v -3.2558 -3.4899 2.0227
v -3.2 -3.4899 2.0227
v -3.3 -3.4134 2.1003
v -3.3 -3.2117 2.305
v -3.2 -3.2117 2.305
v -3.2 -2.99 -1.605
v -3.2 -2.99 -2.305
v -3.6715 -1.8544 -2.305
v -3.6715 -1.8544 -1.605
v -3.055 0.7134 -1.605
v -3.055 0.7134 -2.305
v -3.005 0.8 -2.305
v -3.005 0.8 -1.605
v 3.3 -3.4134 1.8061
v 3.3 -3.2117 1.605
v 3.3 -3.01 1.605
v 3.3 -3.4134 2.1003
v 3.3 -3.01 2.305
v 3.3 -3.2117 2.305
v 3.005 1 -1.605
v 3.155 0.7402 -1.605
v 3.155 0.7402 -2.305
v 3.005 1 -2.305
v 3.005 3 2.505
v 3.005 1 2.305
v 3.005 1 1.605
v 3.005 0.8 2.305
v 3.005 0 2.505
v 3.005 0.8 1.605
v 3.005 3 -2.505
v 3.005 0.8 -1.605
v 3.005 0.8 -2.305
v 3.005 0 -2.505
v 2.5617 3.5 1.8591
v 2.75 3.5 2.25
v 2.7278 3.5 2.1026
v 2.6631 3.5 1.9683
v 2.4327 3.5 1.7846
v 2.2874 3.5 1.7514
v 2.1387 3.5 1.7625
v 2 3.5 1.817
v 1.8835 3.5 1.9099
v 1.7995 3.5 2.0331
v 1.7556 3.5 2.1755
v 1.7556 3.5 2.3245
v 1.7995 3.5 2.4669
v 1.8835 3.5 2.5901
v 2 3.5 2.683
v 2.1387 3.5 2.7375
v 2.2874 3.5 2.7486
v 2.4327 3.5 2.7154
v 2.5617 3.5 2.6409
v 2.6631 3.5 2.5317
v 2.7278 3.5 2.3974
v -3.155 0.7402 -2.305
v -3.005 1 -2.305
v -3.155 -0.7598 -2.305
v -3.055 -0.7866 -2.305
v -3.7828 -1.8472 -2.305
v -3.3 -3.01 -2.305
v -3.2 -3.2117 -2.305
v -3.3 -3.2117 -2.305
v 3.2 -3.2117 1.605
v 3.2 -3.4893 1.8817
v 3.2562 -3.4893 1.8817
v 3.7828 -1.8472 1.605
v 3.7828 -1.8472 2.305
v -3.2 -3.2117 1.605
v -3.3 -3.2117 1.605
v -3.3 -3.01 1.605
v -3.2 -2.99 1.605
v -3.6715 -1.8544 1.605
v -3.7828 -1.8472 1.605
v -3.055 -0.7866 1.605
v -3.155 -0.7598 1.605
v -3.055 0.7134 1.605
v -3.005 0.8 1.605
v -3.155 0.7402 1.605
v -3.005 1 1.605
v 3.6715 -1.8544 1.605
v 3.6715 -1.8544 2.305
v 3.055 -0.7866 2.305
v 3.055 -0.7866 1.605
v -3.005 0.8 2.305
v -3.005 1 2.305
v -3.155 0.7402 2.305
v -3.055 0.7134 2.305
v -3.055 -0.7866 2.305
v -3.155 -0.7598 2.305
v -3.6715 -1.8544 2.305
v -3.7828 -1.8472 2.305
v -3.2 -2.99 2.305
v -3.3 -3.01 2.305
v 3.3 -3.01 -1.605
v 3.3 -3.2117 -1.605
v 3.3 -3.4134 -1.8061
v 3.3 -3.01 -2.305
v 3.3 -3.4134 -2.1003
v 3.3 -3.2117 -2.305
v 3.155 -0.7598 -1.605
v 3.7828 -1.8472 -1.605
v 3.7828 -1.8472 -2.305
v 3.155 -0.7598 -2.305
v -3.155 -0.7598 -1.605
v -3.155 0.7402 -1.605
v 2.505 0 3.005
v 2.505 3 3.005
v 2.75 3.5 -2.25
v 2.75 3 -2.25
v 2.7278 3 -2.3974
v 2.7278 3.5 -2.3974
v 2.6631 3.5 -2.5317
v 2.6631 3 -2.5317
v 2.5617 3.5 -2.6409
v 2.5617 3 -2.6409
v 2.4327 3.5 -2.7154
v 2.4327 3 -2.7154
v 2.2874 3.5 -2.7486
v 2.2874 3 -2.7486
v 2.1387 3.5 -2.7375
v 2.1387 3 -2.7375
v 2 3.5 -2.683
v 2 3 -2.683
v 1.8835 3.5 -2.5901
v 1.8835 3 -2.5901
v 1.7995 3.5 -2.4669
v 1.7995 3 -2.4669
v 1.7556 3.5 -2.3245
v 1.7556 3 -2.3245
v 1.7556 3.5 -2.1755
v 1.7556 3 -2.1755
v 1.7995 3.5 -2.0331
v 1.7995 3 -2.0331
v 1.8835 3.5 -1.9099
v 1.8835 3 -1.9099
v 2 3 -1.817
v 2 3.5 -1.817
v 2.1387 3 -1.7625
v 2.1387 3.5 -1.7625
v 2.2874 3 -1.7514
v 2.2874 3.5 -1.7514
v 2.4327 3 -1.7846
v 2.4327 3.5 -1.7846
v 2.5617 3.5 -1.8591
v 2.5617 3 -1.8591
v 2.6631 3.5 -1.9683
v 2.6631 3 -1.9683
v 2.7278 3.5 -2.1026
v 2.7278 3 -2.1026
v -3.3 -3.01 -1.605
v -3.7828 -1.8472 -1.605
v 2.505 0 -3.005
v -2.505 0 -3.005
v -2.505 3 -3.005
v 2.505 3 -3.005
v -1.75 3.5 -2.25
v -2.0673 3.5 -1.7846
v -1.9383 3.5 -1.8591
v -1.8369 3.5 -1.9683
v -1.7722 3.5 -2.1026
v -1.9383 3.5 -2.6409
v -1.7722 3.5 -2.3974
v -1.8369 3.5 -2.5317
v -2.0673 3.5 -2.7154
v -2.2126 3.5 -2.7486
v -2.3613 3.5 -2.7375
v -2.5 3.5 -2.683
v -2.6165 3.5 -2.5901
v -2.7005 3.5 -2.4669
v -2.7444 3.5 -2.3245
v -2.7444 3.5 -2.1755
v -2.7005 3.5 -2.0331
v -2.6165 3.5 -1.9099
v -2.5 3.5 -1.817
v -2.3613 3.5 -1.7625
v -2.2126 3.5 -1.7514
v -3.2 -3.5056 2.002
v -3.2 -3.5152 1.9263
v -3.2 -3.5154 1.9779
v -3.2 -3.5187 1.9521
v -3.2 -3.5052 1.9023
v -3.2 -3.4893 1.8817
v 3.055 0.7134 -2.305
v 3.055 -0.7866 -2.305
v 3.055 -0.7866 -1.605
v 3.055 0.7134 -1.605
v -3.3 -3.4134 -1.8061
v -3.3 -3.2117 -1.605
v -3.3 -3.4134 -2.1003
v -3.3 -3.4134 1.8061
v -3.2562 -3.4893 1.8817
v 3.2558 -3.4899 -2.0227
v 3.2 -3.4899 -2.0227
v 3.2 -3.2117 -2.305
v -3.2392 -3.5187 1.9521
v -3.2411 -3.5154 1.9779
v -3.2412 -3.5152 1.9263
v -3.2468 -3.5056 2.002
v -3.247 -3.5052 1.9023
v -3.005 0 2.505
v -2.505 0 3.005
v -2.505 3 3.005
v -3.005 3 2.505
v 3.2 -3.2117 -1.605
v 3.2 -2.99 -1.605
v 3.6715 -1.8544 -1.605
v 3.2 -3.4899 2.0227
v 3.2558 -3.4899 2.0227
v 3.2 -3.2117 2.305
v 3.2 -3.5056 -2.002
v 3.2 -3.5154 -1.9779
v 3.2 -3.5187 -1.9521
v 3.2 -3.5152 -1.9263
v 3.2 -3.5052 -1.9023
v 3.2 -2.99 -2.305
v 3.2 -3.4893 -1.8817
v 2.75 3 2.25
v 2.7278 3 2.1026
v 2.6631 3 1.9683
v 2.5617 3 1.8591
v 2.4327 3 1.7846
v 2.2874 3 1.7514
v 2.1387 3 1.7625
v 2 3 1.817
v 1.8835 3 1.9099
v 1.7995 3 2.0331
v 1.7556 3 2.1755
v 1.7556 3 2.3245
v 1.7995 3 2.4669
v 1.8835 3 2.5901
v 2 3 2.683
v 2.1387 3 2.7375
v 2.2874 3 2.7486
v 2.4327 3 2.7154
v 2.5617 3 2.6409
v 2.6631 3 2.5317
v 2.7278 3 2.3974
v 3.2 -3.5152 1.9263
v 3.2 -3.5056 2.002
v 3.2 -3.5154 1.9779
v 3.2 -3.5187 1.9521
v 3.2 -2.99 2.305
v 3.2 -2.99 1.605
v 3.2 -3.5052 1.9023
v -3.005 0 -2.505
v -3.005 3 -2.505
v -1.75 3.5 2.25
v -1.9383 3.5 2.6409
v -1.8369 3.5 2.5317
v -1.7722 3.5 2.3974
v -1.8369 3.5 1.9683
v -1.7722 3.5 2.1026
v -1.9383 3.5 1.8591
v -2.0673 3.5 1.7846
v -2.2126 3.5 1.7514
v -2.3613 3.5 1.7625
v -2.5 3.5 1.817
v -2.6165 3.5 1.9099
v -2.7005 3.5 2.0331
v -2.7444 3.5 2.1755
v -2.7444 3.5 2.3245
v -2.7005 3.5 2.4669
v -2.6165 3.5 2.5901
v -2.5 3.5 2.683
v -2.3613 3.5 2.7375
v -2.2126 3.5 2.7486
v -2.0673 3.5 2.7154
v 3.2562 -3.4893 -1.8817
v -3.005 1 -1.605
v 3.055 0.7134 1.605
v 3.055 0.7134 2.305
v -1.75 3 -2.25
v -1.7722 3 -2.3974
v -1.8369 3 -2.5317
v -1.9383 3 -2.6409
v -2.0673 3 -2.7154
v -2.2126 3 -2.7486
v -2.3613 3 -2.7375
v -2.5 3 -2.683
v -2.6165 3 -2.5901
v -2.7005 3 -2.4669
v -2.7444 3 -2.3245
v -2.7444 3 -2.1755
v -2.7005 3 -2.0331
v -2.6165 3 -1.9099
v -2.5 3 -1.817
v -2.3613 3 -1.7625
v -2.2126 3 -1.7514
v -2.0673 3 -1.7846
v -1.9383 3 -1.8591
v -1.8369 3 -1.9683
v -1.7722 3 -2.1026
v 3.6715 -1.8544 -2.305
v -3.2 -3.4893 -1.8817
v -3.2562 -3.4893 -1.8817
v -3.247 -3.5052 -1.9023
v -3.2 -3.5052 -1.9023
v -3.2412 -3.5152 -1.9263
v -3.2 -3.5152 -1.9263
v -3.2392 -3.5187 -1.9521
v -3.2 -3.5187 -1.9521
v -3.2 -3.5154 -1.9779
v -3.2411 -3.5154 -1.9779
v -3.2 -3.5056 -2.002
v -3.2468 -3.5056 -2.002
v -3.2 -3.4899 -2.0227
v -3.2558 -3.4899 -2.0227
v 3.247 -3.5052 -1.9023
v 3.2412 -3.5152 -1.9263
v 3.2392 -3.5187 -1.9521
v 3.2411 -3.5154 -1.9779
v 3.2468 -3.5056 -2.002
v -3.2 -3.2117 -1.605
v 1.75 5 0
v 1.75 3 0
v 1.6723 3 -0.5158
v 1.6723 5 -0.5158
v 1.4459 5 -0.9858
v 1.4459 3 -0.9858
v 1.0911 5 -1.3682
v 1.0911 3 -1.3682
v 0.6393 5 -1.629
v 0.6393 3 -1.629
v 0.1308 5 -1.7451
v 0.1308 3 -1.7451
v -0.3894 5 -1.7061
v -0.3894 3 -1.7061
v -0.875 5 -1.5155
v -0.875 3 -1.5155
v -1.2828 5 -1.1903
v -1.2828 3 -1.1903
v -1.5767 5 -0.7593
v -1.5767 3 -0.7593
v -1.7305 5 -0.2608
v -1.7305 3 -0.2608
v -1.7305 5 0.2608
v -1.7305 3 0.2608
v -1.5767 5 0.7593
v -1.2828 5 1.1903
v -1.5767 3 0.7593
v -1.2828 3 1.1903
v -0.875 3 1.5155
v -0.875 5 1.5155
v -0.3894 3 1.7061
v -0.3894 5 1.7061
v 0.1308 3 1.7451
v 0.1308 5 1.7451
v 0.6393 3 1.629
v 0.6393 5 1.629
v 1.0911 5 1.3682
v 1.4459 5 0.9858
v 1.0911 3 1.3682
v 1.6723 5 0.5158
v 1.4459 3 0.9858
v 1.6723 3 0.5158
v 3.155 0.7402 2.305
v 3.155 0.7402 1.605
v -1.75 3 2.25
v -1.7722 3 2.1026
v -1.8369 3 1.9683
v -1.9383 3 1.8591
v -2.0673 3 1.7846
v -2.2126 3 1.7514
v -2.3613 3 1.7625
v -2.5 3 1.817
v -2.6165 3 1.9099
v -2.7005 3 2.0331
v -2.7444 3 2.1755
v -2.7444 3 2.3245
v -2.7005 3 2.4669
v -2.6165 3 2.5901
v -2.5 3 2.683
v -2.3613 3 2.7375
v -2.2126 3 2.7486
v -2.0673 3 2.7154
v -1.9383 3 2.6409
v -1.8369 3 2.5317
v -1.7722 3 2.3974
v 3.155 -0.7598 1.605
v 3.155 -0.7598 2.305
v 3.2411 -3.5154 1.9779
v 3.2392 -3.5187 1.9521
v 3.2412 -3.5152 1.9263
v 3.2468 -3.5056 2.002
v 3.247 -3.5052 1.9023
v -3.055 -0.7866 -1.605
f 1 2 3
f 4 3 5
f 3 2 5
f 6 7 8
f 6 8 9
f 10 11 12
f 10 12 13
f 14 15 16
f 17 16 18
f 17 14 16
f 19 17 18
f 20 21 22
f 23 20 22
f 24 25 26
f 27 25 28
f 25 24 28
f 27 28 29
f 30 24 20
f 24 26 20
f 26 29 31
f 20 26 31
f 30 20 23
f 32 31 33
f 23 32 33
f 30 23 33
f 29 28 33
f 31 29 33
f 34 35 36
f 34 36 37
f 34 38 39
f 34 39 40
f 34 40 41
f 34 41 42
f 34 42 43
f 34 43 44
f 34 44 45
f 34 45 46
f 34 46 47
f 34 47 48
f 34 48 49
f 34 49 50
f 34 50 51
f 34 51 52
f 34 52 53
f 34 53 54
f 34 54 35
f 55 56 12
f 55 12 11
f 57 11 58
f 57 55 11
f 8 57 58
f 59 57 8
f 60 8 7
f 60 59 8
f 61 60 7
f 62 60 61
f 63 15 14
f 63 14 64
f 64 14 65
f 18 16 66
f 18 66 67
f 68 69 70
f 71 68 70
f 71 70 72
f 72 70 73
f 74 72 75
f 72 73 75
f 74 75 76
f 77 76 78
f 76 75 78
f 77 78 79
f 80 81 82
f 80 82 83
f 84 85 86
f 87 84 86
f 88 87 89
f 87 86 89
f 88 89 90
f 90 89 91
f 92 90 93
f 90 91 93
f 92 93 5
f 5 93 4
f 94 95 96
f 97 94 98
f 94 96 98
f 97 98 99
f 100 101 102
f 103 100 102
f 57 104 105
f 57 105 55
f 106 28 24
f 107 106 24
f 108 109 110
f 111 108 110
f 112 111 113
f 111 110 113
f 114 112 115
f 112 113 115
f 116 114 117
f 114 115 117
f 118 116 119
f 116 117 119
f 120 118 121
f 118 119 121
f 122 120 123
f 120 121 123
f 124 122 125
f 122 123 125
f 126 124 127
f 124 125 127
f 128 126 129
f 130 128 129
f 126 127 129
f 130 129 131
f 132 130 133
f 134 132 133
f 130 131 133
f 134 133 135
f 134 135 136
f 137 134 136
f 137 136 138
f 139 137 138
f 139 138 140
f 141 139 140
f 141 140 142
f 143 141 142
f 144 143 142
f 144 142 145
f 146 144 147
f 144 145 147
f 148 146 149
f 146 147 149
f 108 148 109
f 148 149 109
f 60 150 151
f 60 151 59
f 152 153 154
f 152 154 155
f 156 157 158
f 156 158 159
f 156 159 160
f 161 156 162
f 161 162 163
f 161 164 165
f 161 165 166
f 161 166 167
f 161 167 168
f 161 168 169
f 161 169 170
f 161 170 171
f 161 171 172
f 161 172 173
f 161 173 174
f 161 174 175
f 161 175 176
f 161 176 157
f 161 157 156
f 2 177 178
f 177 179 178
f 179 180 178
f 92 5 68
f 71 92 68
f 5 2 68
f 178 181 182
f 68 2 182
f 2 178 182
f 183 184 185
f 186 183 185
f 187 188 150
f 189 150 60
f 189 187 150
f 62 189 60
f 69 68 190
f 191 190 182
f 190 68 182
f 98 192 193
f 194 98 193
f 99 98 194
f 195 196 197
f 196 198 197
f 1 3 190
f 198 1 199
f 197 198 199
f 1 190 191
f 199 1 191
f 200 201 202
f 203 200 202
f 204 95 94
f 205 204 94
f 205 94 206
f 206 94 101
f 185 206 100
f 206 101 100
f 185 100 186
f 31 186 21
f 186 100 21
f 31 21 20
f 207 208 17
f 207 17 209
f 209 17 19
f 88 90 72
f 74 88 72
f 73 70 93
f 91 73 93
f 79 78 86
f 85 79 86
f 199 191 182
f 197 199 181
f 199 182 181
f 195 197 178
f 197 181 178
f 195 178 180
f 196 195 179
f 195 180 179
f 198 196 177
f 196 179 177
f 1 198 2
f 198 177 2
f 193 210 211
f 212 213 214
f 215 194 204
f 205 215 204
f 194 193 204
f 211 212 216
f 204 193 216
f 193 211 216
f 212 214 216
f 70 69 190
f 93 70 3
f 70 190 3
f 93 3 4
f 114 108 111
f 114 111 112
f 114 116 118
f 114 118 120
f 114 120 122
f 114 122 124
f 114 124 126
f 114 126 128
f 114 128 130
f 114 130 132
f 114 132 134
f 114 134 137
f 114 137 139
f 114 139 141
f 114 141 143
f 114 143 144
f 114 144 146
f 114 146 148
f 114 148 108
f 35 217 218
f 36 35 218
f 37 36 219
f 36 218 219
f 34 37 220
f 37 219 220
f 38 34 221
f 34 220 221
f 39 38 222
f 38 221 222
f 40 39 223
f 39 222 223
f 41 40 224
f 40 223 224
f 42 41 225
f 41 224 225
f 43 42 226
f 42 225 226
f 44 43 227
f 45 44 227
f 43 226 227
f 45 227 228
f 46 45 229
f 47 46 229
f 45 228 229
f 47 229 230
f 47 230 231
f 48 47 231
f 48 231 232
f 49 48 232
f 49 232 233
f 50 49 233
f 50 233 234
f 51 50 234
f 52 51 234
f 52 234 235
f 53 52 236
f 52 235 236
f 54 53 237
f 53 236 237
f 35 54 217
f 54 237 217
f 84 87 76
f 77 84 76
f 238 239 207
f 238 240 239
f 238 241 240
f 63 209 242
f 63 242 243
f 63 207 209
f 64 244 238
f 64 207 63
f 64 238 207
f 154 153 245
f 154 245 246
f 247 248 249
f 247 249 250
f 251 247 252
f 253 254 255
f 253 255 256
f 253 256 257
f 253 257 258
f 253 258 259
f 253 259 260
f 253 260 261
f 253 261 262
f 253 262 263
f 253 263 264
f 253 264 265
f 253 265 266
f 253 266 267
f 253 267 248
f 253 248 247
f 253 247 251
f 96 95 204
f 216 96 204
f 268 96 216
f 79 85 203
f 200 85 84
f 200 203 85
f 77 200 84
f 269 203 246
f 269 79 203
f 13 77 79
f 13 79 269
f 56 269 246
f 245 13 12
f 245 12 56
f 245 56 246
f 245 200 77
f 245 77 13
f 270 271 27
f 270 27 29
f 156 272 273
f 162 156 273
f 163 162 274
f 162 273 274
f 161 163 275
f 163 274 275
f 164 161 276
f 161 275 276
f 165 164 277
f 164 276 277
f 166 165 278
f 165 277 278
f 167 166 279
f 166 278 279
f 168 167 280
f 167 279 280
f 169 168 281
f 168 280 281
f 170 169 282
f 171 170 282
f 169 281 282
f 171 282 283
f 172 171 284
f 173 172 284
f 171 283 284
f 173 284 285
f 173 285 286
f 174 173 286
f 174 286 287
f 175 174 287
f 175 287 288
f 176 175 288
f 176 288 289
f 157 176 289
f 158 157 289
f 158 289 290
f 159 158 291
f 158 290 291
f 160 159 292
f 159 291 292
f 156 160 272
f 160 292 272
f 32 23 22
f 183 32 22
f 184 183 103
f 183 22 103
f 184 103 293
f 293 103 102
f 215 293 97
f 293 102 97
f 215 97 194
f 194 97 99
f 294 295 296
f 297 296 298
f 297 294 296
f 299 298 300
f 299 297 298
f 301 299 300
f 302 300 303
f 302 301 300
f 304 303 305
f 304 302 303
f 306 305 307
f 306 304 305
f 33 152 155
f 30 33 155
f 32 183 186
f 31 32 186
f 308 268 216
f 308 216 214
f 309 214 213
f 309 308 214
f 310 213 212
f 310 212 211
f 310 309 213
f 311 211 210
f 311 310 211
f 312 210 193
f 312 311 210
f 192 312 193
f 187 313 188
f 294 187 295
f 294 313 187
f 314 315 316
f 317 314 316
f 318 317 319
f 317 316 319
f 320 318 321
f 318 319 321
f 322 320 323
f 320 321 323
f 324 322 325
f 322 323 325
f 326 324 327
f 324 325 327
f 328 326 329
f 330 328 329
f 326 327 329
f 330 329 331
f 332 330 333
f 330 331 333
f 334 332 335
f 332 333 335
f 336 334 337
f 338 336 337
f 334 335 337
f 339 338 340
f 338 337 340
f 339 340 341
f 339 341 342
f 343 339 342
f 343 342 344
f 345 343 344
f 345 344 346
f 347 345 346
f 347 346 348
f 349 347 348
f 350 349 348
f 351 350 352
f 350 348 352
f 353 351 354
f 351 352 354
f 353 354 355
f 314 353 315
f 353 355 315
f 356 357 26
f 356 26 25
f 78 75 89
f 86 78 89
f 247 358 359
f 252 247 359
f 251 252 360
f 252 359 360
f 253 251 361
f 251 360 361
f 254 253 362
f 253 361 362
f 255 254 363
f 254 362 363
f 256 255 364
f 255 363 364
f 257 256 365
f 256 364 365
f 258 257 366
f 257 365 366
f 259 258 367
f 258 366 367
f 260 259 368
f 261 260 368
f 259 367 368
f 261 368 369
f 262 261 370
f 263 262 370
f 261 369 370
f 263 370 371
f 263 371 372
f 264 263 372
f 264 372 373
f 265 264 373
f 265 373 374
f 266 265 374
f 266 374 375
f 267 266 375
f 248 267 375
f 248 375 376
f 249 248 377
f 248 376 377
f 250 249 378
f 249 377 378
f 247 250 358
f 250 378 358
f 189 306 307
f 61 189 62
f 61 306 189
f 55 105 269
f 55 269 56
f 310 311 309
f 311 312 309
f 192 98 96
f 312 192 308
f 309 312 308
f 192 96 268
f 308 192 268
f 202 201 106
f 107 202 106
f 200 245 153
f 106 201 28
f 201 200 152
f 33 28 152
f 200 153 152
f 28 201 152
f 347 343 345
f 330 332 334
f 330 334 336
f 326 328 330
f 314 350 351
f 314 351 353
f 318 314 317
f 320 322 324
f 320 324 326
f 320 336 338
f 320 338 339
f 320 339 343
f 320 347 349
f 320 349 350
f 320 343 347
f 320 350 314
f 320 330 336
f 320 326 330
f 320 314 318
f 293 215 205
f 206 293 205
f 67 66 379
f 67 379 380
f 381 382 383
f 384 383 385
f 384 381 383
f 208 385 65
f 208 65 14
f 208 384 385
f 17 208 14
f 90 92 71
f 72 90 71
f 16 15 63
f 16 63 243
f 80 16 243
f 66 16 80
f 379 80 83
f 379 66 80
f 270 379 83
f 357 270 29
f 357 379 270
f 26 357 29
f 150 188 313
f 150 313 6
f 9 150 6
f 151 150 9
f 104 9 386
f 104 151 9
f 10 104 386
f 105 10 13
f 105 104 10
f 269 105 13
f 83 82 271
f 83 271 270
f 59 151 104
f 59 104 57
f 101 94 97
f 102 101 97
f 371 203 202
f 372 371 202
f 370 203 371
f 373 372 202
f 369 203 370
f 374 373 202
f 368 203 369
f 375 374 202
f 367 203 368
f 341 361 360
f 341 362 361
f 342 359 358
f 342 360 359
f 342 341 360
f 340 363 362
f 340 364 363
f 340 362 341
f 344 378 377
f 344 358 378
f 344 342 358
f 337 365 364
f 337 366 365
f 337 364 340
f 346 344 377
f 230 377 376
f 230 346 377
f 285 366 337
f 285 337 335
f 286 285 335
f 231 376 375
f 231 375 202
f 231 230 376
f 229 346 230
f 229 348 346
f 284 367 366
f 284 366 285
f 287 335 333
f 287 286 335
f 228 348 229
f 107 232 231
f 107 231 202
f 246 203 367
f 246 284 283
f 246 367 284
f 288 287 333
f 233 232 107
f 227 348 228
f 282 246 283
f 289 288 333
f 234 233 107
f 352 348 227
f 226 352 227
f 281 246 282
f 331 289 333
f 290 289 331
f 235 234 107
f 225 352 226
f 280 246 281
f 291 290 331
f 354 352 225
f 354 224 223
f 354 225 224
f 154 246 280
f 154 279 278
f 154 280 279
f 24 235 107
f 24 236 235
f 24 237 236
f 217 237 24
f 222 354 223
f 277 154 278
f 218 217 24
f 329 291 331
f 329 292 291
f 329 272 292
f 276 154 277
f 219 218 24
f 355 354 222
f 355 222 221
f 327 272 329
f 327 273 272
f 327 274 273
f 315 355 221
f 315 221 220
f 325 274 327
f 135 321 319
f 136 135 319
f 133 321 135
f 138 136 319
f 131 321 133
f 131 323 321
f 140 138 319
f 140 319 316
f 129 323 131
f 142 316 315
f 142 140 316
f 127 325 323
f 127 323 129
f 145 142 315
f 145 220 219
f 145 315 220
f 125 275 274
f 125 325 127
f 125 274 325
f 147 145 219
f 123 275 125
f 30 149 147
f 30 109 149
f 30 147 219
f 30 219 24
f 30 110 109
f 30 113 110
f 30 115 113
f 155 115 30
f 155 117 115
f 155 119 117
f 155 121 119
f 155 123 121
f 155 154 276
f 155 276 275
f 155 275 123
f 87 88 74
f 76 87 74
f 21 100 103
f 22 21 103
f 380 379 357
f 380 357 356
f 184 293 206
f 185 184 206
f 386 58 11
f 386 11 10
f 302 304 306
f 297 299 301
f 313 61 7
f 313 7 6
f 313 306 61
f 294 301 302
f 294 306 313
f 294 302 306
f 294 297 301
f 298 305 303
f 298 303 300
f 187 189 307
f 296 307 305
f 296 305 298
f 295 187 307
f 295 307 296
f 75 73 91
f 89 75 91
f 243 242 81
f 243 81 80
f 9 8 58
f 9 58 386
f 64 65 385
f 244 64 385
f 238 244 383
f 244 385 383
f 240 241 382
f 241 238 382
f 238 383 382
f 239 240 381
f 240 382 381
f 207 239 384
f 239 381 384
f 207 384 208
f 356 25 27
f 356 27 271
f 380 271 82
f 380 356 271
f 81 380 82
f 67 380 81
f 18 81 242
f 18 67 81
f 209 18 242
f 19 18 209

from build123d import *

# Parameters (mm, degrees)
SKETCH1_W               = 6.01
SKETCH1_H               = 6.01
BOSS_EXTRUDE1_DEPTH     = 3
CHAMFER1_SIZE           = 0.5
SKETCH3_R               = 1.75
BOSS_EXTRUDE2_DEPTH     = 2
SKETCH4_R               = 0.5
BOSS_EXTRUDE6_DEPTH     = 0.5
SKETCH5_R               = 0.5
BOSS_EXTRUDE7_DEPTH     = 0.5
SKETCH6_W               = 0.7
SKETCH6_H               = 0.2
MIRROR2_COPY_1_SKETCH_W = 0.7
MIRROR2_COPY_1_SKETCH_H = 0.2
CUT_EXTRUDE1_DEPTH      = 4.782799277


with BuildPart() as part:
    # Sketch1 → Boss-Extrude1 (new body)
    with BuildSketch(Plane(origin=(0, 0, 0), x_dir=(1, 0, 0), z_dir=(0, 1, 0))):
        Rectangle(SKETCH1_W, SKETCH1_H)
    extrude(amount=BOSS_EXTRUDE1_DEPTH)

    # Chamfer1
    chamfer1_edges = [part.edges().sort_by_distance(p)[0] for p in [
        (3.005, 1.5, 3.005),
        (-3.005, 1.5, 3.005),
        (-3.005, 1.5, -3.005),
        (3.005, 1.5, -3.005),
    ]]
    chamfer(chamfer1_edges, length=CHAMFER1_SIZE)

    # Sketch3 → Boss-Extrude2 (add)
    with BuildSketch(Plane(origin=(0, 3, 0), x_dir=(1, 0, 0), z_dir=(0, 1, 0))):
        Circle(SKETCH3_R)
    extrude(amount=BOSS_EXTRUDE2_DEPTH)

    # Sketch4 → Boss-Extrude6 (add)
    with BuildSketch(Plane(origin=(0, 3, 0), x_dir=(1, 0, 0), z_dir=(0, 1, 0))):
        with Locations((2.25, 2.25)):
            Circle(SKETCH4_R)
        with Locations((2.25, -2.25)):
            Circle(SKETCH4_R)
        with Locations((-2.25, 2.25)):
            Circle(SKETCH4_R)
    extrude(amount=BOSS_EXTRUDE6_DEPTH)

    # Sketch5 → Boss-Extrude7 (add)
    with BuildSketch(Plane(origin=(0, 3, 0), x_dir=(1, 0, 0), z_dir=(0, 1, 0))):
        with Locations((-2.25, -2.25)):
            Circle(SKETCH5_R)
    extrude(amount=BOSS_EXTRUDE7_DEPTH)

    # Sweep1: sweep along a path in Sketch7
    with BuildLine(Plane.XY) as sweep1_path:
        Line((-3.005, 0.9), (-3.105, 0.726794919))
        Line((-3.105, 0.726794919), (-3.105, -0.773205081))
        Line((-3.105, -0.773205081), (-3.72715614, -1.850811126))
        Line((-3.72715614, -1.850811126), (-3.25, -3))
        Line((-3.25, -3), (-3.25, -3.5))
    # Sketch6 → Sweep1 (sweep)
    with BuildSketch(Plane.ZY.offset(3.005)):
        with Locations((-1.955, 0.9)):
            Rectangle(SKETCH6_W, SKETCH6_H)
    sweep1 = sweep(path=sweep1_path.line, transition=Transition.RIGHT)

    # Mirror1: Sweep1 across plane
    add(sweep1.mirror(Plane.XY))

    # Mirror2: Sweep1 across plane
    add(sweep1.mirror(Plane(origin=(0, 0, 0), x_dir=(0, 0, 1), z_dir=(1, 0, 0))))

    # Mirror2 copy 1: sweep along a path in Mirror2 copy 1 path
    with BuildLine(Plane(origin=(0, 0, 0), x_dir=(-1, 0, 0), z_dir=(0, 0, -1))) as mirror2_copy_1_path:
        Line((-3.005, 0.9), (-3.105, 0.726794919))
        Line((-3.105, 0.726794919), (-3.105, -0.773205081))
        Line((-3.105, -0.773205081), (-3.72715614, -1.850811126))
        Line((-3.72715614, -1.850811126), (-3.25, -3))
        Line((-3.25, -3), (-3.25, -3.5))
    # Mirror2 copy 1 sketch → Mirror2 copy 1 (sweep)
    with BuildSketch(Plane(origin=(3.005, 0, 0), x_dir=(0, 0, -1), z_dir=(1, 0, 0))):
        with Locations((-1.955, 0.9)):
            Rectangle(MIRROR2_COPY_1_SKETCH_W, MIRROR2_COPY_1_SKETCH_H)
    sweep(path=mirror2_copy_1_path.line, transition=Transition.RIGHT)

    # Sketch8 → Cut-Extrude1 (cut, symmetric)
    with BuildSketch(Plane(origin=(0, 0, 0), x_dir=(0, 0, -1), z_dir=(1, 0, 0))):
        with BuildLine():
            Line((-2.305, -3.211682602), (-2.305, -3.58660254))
            Line((-2.305, -3.58660254), (-1.605, -3.58660254))
            Line((-1.605, -3.58660254), (-1.605, -3.211682602))
            Line((-1.605, -3.211682602), (-1.881694927, -3.48928466))
            ThreePointArc((-1.881694927, -3.48928466), (-1.952077784, -3.518688814), (-2.022718654, -3.489910032))
            Line((-2.022718654, -3.489910032), (-2.305, -3.211682602))
        make_face()
    cut_extrude1 = extrude(amount=CUT_EXTRUDE1_DEPTH, both=True, mode=Mode.SUBTRACT)

    # Mirror3: Cut-Extrude1 across plane
    add(cut_extrude1.mirror(Plane.XY), mode=Mode.SUBTRACT)


solid = part.part
